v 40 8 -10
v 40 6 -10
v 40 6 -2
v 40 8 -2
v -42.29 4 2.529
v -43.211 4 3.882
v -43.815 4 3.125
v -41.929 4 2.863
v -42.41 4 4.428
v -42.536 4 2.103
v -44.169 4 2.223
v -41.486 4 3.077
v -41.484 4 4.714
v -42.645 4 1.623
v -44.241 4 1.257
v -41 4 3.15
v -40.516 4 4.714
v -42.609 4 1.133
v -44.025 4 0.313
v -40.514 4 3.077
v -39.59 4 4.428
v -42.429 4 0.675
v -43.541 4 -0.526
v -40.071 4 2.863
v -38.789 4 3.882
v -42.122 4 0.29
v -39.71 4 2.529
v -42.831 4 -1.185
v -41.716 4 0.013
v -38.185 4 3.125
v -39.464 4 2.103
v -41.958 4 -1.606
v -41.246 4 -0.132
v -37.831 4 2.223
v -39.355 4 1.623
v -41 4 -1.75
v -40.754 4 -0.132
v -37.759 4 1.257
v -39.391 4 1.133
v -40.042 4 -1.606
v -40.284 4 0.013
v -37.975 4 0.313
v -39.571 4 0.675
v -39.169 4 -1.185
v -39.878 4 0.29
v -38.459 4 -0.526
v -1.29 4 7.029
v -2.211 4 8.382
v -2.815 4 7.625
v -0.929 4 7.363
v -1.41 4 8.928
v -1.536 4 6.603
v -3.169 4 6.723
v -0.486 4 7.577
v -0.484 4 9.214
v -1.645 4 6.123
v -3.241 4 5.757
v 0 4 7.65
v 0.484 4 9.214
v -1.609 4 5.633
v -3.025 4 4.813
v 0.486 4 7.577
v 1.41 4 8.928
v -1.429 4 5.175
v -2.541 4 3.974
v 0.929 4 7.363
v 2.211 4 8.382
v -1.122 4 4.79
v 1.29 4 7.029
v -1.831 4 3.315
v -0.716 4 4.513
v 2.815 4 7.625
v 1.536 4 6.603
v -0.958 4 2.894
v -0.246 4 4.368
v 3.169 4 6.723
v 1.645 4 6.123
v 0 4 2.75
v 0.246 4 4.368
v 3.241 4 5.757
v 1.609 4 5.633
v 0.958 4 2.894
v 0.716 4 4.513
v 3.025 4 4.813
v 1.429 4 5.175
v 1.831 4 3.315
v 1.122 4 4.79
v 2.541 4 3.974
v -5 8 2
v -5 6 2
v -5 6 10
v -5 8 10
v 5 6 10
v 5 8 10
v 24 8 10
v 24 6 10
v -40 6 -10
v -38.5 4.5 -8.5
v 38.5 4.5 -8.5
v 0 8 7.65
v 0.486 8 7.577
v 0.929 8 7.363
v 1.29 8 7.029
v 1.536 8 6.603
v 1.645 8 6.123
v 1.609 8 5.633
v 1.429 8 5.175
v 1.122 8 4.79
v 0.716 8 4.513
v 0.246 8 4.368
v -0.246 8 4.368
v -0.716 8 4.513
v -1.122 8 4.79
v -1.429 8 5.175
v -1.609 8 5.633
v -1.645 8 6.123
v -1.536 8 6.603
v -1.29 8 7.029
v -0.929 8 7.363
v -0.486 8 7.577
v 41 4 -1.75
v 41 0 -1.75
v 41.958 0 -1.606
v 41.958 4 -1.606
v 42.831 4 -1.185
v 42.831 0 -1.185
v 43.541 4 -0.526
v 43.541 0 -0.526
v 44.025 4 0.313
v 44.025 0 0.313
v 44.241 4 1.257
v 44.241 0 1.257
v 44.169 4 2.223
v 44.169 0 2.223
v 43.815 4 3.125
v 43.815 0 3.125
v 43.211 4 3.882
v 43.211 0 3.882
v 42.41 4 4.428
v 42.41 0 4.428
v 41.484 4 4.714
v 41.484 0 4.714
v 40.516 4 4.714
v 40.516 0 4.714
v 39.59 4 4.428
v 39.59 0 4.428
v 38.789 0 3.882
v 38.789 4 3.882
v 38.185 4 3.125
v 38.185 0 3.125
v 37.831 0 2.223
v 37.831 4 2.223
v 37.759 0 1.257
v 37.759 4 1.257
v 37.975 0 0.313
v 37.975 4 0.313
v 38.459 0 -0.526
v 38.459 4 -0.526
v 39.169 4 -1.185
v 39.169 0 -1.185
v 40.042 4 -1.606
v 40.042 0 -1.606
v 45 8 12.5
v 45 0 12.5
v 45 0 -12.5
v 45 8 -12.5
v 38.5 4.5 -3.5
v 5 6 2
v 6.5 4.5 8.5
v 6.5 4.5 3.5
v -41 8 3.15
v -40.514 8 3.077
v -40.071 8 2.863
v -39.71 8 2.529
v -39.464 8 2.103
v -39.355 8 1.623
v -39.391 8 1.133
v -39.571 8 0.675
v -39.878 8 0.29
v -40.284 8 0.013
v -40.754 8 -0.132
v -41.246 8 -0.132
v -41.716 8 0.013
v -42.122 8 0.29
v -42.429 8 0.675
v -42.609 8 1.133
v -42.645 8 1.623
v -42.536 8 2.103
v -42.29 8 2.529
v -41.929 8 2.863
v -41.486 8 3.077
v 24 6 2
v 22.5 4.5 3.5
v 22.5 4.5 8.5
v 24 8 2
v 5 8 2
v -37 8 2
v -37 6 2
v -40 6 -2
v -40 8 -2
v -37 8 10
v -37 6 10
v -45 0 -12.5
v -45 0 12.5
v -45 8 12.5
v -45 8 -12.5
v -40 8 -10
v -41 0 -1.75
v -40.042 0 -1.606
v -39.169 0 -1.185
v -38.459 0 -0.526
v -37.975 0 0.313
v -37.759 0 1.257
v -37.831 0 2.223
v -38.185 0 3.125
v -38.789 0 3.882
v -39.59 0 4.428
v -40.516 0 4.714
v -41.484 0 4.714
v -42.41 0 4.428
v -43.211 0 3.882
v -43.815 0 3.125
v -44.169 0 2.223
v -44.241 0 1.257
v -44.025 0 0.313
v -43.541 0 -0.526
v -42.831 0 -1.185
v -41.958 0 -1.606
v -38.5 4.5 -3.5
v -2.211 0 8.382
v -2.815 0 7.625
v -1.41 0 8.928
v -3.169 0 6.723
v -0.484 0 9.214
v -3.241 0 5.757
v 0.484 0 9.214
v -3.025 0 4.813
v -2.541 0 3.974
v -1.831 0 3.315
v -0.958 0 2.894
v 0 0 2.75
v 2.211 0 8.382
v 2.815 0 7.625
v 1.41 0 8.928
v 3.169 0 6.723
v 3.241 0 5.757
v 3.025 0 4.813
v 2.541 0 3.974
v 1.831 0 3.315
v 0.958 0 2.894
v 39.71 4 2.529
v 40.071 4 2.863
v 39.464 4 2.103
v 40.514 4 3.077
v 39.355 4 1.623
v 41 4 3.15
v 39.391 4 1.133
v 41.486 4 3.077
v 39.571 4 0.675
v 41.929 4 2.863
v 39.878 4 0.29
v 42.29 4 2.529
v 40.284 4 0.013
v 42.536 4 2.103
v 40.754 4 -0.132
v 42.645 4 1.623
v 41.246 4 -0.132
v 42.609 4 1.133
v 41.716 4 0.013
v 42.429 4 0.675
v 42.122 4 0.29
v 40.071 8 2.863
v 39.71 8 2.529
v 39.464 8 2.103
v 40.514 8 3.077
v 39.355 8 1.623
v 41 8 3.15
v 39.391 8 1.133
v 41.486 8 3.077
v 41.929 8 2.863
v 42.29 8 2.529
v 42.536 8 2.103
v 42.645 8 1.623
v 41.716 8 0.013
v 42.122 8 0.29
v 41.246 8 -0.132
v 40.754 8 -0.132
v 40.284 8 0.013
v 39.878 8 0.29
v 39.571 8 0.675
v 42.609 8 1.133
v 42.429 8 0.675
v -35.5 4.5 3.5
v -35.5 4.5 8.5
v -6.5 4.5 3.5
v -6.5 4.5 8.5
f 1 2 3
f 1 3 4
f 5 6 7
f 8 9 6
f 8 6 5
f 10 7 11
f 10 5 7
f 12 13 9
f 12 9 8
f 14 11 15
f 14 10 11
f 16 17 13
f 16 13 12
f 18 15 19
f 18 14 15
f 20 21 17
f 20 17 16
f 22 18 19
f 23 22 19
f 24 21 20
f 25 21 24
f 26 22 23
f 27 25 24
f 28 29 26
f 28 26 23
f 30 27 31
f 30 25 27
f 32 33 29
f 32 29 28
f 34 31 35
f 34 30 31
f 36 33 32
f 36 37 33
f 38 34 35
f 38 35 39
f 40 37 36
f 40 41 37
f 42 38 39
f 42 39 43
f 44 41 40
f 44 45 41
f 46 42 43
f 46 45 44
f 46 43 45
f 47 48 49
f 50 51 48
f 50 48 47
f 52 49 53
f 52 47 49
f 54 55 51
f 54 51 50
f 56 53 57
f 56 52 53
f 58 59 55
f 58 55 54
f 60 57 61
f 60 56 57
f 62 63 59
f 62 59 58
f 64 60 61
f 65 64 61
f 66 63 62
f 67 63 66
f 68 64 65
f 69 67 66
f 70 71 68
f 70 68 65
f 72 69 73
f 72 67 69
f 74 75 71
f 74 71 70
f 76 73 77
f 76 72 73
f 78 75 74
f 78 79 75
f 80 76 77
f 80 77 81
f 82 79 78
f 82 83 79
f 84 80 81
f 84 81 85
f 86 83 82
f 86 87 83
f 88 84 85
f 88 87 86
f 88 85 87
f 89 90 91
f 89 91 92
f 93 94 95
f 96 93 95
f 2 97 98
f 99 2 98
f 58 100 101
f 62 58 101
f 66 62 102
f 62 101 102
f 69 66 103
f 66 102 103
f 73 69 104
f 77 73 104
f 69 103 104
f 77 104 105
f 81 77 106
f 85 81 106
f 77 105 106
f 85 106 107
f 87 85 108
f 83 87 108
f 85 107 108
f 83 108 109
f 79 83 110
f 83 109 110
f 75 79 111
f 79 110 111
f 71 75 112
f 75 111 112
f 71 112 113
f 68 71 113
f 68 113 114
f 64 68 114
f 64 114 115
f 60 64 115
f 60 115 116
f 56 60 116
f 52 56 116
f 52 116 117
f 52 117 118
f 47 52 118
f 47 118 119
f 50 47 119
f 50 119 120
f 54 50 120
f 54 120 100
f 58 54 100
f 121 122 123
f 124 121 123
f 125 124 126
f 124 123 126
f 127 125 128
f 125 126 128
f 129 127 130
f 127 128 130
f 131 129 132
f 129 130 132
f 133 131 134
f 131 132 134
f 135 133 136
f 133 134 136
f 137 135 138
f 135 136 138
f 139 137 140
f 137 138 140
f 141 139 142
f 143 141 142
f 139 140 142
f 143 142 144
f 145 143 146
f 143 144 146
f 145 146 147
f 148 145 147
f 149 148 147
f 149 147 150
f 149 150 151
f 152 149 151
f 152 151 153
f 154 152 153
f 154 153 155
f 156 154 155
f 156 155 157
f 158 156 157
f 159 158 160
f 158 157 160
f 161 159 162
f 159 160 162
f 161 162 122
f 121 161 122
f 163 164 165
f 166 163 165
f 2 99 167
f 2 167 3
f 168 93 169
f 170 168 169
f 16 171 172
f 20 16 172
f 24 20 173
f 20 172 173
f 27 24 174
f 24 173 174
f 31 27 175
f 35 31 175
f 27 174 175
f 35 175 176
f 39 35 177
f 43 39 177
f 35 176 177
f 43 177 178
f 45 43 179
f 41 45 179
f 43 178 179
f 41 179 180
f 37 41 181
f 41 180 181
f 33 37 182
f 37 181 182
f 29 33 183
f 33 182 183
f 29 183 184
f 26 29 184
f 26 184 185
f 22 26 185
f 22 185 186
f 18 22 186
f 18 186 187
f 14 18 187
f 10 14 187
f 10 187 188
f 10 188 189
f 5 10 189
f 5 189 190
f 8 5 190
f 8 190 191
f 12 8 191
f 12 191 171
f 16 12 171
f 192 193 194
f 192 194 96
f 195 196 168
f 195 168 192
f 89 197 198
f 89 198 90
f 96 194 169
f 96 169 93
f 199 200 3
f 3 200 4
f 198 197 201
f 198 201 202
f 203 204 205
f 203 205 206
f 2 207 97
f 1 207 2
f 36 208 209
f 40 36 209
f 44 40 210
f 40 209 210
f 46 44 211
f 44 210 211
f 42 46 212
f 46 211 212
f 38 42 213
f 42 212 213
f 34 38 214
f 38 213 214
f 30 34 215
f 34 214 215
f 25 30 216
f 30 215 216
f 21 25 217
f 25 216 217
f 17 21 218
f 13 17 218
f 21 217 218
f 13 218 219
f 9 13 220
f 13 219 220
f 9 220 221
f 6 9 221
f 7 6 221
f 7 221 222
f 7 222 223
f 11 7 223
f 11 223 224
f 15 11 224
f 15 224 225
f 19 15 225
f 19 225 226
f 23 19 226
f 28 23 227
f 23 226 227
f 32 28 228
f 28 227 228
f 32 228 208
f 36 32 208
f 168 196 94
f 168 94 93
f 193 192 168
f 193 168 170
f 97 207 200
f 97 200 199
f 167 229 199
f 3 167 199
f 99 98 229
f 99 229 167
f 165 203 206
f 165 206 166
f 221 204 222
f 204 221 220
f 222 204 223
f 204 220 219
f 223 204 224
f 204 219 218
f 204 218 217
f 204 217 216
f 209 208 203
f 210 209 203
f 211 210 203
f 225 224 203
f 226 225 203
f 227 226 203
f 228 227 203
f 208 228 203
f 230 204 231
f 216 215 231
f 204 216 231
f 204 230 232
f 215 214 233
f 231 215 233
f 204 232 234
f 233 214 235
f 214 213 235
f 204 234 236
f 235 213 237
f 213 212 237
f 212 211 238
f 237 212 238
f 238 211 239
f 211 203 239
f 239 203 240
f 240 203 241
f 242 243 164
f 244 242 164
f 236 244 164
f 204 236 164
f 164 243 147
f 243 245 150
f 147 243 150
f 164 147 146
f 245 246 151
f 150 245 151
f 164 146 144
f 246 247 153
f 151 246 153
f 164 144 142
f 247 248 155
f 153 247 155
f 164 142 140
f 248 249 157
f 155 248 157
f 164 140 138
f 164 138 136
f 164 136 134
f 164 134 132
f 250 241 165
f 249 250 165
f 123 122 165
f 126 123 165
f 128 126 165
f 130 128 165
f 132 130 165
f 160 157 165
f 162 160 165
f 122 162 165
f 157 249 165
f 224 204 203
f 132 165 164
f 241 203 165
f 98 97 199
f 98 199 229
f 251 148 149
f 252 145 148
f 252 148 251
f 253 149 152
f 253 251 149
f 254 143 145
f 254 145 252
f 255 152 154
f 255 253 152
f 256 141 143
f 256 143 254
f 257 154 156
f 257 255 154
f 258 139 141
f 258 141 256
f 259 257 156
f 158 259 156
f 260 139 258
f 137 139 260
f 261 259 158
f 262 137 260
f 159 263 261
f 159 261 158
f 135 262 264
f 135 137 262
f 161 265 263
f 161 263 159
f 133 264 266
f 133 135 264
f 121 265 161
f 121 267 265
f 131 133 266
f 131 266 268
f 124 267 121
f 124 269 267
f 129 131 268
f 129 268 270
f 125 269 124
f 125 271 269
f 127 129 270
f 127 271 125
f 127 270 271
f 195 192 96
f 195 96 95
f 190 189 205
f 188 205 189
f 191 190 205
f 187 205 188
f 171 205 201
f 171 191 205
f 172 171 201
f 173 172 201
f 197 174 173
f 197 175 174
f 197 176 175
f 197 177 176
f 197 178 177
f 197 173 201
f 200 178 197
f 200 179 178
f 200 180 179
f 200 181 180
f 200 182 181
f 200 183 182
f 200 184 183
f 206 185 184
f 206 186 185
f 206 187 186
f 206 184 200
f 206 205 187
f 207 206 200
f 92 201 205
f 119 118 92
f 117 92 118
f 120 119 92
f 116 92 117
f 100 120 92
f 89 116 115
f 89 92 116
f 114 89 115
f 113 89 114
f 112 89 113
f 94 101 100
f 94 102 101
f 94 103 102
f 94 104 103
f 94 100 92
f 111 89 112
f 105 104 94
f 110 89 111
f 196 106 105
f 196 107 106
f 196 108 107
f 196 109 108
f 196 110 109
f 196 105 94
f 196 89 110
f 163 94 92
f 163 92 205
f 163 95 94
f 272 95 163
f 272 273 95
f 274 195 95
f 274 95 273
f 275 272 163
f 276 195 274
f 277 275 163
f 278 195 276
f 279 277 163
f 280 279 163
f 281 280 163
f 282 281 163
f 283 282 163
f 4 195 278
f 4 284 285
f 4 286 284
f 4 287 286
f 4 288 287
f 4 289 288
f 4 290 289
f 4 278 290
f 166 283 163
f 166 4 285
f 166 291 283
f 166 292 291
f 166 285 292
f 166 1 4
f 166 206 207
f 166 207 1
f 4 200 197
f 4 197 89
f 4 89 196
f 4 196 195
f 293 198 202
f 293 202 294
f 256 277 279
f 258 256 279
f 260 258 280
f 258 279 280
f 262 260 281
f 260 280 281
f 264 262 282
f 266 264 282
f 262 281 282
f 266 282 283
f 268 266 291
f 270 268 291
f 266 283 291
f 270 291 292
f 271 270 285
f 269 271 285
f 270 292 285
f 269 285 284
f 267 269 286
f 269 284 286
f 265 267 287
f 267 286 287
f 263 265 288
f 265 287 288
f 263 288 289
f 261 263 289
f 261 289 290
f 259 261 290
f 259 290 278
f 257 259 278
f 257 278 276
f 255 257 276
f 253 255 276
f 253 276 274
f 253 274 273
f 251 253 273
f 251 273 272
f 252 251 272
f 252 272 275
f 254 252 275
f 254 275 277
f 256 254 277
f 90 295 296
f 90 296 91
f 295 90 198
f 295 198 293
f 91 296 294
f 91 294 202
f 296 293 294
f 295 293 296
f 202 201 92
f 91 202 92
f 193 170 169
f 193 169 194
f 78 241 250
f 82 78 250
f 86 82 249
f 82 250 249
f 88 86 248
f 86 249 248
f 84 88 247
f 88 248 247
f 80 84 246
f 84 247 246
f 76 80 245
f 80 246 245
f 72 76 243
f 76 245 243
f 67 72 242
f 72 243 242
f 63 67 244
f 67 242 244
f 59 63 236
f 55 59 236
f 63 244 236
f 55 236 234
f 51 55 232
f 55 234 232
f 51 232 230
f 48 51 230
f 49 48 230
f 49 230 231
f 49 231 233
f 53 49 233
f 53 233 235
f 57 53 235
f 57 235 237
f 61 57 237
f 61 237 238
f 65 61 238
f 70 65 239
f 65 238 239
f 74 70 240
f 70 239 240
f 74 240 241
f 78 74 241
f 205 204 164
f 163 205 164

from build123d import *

# Parameters (mm, degrees)
ESQUISSE1_W             = 90
ESQUISSE1_H             = 25
BOSS_EXTRU_1_DEPTH      = 8
ESQUISSE3_R             = 1.65
ENL_V_MAT_EXTRU_1_DEPTH = 48.384069053
ESQUISSE4_R             = 3.25
ENL_V_MAT_EXTRU_2_DEPTH = 4
EMPREINTE1_START        = -10
EMPREINTE1_DEPTH        = 8
EMPREINTE1_START_2      = 2
EMPREINTE1_2_DEPTH      = 8
EMPREINTE1_START_3      = -38.94589
EMPREINTE1_3_DEPTH      = 77.9
EMPREINTE1_START_4      = -41
EMPREINTE1_4_DEPTH      = 82


with BuildPart() as part:
    # Esquisse1 → Boss.-Extru.1 (new body)
    with BuildSketch(Plane(origin=(0, 0, 0), x_dir=(1, 0, 0), z_dir=(0, 1, 0))):
        Rectangle(ESQUISSE1_W, ESQUISSE1_H)
    extrude(amount=BOSS_EXTRU_1_DEPTH)

    # Esquisse3 → Enlèv. mat.-Extru.1 (cut, through all)
    with BuildSketch(Plane(origin=(0, 8, 0), x_dir=(1, 0, 0), z_dir=(0, 1, 0))):
        with Locations(Location((0, -6, 0), (0, 0, 270))):
            Circle(ESQUISSE3_R)
        with Locations(Location((41, -1.5, 0), (0, 0, 270))):
            Circle(ESQUISSE3_R)
        with Locations(Location((-41, -1.5, 0), (0, 0, 270))):
            Circle(ESQUISSE3_R)
    extrude(amount=-ENL_V_MAT_EXTRU_1_DEPTH, mode=Mode.SUBTRACT)

    # Esquisse4 → Enlèv. mat.-Extru.2 (cut)
    with BuildSketch(Plane.XZ):
        with Locations(Location((-41, 1.5, 0), (0, 0, 270))):
            Circle(ESQUISSE4_R)
        with Locations(Location((41, 1.5, 0), (0, 0, 270))):
            Circle(ESQUISSE4_R)
        with Locations(Location((0, 6, 0), (0, 0, 270))):
            Circle(ESQUISSE4_R)
    extrude(amount=-ENL_V_MAT_EXTRU_2_DEPTH, mode=Mode.SUBTRACT)

    # Empreinte1: read off the stored shape, not the designer's step
    # Empreinte1 outline → Empreinte1 (cut)
    with BuildSketch(Plane.XY.offset(EMPREINTE1_START)):
        Polygon((40, 8), (-40, 8), (-40, 6), (-38.5, 4.5), (38.5, 4.5), (40, 6), align=None)
    extrude(amount=EMPREINTE1_DEPTH, mode=Mode.SUBTRACT)

    # Empreinte1 2 outline → Empreinte1 2 (cut)
    with BuildSketch(Plane.XY.offset(EMPREINTE1_START_2)):
        Polygon((6.5, 4.5), (22.5, 4.5), (24, 6), (24, 8), (5, 8), (5, 6), align=None)
        Polygon((-35.5, 4.5), (-6.5, 4.5), (-5, 6), (-5, 8), (-37, 8), (-37, 6), align=None)
    extrude(amount=EMPREINTE1_2_DEPTH, mode=Mode.SUBTRACT)

    # Empreinte1 3 outline → Empreinte1 3 (add)
    with BuildSketch(Plane.YZ.offset(EMPREINTE1_START_3)):
        Polygon((4.5, 2), (6, 2), (4.5, 3.5), align=None)
        Polygon((4.5, 10), (4.5, 8.5), (6, 10), align=None)
        Polygon((6, -10), (4.5, -8.5), (4.5, -10), align=None)
        Polygon((4.5, -2), (4.5, -3.5), (6, -2), align=None)
    extrude(amount=EMPREINTE1_3_DEPTH)

    # Empreinte1 4 outline → Empreinte1 4 (add)
    with BuildSketch(Plane.YZ.offset(EMPREINTE1_START_4)):
        Polygon((6, -10), (4.5, -8.5), (4.5, -10), align=None)
        Polygon((4.5, -2), (4.5, -3.5), (6, -2), align=None)
    extrude(amount=EMPREINTE1_4_DEPTH)


solid = part.part
